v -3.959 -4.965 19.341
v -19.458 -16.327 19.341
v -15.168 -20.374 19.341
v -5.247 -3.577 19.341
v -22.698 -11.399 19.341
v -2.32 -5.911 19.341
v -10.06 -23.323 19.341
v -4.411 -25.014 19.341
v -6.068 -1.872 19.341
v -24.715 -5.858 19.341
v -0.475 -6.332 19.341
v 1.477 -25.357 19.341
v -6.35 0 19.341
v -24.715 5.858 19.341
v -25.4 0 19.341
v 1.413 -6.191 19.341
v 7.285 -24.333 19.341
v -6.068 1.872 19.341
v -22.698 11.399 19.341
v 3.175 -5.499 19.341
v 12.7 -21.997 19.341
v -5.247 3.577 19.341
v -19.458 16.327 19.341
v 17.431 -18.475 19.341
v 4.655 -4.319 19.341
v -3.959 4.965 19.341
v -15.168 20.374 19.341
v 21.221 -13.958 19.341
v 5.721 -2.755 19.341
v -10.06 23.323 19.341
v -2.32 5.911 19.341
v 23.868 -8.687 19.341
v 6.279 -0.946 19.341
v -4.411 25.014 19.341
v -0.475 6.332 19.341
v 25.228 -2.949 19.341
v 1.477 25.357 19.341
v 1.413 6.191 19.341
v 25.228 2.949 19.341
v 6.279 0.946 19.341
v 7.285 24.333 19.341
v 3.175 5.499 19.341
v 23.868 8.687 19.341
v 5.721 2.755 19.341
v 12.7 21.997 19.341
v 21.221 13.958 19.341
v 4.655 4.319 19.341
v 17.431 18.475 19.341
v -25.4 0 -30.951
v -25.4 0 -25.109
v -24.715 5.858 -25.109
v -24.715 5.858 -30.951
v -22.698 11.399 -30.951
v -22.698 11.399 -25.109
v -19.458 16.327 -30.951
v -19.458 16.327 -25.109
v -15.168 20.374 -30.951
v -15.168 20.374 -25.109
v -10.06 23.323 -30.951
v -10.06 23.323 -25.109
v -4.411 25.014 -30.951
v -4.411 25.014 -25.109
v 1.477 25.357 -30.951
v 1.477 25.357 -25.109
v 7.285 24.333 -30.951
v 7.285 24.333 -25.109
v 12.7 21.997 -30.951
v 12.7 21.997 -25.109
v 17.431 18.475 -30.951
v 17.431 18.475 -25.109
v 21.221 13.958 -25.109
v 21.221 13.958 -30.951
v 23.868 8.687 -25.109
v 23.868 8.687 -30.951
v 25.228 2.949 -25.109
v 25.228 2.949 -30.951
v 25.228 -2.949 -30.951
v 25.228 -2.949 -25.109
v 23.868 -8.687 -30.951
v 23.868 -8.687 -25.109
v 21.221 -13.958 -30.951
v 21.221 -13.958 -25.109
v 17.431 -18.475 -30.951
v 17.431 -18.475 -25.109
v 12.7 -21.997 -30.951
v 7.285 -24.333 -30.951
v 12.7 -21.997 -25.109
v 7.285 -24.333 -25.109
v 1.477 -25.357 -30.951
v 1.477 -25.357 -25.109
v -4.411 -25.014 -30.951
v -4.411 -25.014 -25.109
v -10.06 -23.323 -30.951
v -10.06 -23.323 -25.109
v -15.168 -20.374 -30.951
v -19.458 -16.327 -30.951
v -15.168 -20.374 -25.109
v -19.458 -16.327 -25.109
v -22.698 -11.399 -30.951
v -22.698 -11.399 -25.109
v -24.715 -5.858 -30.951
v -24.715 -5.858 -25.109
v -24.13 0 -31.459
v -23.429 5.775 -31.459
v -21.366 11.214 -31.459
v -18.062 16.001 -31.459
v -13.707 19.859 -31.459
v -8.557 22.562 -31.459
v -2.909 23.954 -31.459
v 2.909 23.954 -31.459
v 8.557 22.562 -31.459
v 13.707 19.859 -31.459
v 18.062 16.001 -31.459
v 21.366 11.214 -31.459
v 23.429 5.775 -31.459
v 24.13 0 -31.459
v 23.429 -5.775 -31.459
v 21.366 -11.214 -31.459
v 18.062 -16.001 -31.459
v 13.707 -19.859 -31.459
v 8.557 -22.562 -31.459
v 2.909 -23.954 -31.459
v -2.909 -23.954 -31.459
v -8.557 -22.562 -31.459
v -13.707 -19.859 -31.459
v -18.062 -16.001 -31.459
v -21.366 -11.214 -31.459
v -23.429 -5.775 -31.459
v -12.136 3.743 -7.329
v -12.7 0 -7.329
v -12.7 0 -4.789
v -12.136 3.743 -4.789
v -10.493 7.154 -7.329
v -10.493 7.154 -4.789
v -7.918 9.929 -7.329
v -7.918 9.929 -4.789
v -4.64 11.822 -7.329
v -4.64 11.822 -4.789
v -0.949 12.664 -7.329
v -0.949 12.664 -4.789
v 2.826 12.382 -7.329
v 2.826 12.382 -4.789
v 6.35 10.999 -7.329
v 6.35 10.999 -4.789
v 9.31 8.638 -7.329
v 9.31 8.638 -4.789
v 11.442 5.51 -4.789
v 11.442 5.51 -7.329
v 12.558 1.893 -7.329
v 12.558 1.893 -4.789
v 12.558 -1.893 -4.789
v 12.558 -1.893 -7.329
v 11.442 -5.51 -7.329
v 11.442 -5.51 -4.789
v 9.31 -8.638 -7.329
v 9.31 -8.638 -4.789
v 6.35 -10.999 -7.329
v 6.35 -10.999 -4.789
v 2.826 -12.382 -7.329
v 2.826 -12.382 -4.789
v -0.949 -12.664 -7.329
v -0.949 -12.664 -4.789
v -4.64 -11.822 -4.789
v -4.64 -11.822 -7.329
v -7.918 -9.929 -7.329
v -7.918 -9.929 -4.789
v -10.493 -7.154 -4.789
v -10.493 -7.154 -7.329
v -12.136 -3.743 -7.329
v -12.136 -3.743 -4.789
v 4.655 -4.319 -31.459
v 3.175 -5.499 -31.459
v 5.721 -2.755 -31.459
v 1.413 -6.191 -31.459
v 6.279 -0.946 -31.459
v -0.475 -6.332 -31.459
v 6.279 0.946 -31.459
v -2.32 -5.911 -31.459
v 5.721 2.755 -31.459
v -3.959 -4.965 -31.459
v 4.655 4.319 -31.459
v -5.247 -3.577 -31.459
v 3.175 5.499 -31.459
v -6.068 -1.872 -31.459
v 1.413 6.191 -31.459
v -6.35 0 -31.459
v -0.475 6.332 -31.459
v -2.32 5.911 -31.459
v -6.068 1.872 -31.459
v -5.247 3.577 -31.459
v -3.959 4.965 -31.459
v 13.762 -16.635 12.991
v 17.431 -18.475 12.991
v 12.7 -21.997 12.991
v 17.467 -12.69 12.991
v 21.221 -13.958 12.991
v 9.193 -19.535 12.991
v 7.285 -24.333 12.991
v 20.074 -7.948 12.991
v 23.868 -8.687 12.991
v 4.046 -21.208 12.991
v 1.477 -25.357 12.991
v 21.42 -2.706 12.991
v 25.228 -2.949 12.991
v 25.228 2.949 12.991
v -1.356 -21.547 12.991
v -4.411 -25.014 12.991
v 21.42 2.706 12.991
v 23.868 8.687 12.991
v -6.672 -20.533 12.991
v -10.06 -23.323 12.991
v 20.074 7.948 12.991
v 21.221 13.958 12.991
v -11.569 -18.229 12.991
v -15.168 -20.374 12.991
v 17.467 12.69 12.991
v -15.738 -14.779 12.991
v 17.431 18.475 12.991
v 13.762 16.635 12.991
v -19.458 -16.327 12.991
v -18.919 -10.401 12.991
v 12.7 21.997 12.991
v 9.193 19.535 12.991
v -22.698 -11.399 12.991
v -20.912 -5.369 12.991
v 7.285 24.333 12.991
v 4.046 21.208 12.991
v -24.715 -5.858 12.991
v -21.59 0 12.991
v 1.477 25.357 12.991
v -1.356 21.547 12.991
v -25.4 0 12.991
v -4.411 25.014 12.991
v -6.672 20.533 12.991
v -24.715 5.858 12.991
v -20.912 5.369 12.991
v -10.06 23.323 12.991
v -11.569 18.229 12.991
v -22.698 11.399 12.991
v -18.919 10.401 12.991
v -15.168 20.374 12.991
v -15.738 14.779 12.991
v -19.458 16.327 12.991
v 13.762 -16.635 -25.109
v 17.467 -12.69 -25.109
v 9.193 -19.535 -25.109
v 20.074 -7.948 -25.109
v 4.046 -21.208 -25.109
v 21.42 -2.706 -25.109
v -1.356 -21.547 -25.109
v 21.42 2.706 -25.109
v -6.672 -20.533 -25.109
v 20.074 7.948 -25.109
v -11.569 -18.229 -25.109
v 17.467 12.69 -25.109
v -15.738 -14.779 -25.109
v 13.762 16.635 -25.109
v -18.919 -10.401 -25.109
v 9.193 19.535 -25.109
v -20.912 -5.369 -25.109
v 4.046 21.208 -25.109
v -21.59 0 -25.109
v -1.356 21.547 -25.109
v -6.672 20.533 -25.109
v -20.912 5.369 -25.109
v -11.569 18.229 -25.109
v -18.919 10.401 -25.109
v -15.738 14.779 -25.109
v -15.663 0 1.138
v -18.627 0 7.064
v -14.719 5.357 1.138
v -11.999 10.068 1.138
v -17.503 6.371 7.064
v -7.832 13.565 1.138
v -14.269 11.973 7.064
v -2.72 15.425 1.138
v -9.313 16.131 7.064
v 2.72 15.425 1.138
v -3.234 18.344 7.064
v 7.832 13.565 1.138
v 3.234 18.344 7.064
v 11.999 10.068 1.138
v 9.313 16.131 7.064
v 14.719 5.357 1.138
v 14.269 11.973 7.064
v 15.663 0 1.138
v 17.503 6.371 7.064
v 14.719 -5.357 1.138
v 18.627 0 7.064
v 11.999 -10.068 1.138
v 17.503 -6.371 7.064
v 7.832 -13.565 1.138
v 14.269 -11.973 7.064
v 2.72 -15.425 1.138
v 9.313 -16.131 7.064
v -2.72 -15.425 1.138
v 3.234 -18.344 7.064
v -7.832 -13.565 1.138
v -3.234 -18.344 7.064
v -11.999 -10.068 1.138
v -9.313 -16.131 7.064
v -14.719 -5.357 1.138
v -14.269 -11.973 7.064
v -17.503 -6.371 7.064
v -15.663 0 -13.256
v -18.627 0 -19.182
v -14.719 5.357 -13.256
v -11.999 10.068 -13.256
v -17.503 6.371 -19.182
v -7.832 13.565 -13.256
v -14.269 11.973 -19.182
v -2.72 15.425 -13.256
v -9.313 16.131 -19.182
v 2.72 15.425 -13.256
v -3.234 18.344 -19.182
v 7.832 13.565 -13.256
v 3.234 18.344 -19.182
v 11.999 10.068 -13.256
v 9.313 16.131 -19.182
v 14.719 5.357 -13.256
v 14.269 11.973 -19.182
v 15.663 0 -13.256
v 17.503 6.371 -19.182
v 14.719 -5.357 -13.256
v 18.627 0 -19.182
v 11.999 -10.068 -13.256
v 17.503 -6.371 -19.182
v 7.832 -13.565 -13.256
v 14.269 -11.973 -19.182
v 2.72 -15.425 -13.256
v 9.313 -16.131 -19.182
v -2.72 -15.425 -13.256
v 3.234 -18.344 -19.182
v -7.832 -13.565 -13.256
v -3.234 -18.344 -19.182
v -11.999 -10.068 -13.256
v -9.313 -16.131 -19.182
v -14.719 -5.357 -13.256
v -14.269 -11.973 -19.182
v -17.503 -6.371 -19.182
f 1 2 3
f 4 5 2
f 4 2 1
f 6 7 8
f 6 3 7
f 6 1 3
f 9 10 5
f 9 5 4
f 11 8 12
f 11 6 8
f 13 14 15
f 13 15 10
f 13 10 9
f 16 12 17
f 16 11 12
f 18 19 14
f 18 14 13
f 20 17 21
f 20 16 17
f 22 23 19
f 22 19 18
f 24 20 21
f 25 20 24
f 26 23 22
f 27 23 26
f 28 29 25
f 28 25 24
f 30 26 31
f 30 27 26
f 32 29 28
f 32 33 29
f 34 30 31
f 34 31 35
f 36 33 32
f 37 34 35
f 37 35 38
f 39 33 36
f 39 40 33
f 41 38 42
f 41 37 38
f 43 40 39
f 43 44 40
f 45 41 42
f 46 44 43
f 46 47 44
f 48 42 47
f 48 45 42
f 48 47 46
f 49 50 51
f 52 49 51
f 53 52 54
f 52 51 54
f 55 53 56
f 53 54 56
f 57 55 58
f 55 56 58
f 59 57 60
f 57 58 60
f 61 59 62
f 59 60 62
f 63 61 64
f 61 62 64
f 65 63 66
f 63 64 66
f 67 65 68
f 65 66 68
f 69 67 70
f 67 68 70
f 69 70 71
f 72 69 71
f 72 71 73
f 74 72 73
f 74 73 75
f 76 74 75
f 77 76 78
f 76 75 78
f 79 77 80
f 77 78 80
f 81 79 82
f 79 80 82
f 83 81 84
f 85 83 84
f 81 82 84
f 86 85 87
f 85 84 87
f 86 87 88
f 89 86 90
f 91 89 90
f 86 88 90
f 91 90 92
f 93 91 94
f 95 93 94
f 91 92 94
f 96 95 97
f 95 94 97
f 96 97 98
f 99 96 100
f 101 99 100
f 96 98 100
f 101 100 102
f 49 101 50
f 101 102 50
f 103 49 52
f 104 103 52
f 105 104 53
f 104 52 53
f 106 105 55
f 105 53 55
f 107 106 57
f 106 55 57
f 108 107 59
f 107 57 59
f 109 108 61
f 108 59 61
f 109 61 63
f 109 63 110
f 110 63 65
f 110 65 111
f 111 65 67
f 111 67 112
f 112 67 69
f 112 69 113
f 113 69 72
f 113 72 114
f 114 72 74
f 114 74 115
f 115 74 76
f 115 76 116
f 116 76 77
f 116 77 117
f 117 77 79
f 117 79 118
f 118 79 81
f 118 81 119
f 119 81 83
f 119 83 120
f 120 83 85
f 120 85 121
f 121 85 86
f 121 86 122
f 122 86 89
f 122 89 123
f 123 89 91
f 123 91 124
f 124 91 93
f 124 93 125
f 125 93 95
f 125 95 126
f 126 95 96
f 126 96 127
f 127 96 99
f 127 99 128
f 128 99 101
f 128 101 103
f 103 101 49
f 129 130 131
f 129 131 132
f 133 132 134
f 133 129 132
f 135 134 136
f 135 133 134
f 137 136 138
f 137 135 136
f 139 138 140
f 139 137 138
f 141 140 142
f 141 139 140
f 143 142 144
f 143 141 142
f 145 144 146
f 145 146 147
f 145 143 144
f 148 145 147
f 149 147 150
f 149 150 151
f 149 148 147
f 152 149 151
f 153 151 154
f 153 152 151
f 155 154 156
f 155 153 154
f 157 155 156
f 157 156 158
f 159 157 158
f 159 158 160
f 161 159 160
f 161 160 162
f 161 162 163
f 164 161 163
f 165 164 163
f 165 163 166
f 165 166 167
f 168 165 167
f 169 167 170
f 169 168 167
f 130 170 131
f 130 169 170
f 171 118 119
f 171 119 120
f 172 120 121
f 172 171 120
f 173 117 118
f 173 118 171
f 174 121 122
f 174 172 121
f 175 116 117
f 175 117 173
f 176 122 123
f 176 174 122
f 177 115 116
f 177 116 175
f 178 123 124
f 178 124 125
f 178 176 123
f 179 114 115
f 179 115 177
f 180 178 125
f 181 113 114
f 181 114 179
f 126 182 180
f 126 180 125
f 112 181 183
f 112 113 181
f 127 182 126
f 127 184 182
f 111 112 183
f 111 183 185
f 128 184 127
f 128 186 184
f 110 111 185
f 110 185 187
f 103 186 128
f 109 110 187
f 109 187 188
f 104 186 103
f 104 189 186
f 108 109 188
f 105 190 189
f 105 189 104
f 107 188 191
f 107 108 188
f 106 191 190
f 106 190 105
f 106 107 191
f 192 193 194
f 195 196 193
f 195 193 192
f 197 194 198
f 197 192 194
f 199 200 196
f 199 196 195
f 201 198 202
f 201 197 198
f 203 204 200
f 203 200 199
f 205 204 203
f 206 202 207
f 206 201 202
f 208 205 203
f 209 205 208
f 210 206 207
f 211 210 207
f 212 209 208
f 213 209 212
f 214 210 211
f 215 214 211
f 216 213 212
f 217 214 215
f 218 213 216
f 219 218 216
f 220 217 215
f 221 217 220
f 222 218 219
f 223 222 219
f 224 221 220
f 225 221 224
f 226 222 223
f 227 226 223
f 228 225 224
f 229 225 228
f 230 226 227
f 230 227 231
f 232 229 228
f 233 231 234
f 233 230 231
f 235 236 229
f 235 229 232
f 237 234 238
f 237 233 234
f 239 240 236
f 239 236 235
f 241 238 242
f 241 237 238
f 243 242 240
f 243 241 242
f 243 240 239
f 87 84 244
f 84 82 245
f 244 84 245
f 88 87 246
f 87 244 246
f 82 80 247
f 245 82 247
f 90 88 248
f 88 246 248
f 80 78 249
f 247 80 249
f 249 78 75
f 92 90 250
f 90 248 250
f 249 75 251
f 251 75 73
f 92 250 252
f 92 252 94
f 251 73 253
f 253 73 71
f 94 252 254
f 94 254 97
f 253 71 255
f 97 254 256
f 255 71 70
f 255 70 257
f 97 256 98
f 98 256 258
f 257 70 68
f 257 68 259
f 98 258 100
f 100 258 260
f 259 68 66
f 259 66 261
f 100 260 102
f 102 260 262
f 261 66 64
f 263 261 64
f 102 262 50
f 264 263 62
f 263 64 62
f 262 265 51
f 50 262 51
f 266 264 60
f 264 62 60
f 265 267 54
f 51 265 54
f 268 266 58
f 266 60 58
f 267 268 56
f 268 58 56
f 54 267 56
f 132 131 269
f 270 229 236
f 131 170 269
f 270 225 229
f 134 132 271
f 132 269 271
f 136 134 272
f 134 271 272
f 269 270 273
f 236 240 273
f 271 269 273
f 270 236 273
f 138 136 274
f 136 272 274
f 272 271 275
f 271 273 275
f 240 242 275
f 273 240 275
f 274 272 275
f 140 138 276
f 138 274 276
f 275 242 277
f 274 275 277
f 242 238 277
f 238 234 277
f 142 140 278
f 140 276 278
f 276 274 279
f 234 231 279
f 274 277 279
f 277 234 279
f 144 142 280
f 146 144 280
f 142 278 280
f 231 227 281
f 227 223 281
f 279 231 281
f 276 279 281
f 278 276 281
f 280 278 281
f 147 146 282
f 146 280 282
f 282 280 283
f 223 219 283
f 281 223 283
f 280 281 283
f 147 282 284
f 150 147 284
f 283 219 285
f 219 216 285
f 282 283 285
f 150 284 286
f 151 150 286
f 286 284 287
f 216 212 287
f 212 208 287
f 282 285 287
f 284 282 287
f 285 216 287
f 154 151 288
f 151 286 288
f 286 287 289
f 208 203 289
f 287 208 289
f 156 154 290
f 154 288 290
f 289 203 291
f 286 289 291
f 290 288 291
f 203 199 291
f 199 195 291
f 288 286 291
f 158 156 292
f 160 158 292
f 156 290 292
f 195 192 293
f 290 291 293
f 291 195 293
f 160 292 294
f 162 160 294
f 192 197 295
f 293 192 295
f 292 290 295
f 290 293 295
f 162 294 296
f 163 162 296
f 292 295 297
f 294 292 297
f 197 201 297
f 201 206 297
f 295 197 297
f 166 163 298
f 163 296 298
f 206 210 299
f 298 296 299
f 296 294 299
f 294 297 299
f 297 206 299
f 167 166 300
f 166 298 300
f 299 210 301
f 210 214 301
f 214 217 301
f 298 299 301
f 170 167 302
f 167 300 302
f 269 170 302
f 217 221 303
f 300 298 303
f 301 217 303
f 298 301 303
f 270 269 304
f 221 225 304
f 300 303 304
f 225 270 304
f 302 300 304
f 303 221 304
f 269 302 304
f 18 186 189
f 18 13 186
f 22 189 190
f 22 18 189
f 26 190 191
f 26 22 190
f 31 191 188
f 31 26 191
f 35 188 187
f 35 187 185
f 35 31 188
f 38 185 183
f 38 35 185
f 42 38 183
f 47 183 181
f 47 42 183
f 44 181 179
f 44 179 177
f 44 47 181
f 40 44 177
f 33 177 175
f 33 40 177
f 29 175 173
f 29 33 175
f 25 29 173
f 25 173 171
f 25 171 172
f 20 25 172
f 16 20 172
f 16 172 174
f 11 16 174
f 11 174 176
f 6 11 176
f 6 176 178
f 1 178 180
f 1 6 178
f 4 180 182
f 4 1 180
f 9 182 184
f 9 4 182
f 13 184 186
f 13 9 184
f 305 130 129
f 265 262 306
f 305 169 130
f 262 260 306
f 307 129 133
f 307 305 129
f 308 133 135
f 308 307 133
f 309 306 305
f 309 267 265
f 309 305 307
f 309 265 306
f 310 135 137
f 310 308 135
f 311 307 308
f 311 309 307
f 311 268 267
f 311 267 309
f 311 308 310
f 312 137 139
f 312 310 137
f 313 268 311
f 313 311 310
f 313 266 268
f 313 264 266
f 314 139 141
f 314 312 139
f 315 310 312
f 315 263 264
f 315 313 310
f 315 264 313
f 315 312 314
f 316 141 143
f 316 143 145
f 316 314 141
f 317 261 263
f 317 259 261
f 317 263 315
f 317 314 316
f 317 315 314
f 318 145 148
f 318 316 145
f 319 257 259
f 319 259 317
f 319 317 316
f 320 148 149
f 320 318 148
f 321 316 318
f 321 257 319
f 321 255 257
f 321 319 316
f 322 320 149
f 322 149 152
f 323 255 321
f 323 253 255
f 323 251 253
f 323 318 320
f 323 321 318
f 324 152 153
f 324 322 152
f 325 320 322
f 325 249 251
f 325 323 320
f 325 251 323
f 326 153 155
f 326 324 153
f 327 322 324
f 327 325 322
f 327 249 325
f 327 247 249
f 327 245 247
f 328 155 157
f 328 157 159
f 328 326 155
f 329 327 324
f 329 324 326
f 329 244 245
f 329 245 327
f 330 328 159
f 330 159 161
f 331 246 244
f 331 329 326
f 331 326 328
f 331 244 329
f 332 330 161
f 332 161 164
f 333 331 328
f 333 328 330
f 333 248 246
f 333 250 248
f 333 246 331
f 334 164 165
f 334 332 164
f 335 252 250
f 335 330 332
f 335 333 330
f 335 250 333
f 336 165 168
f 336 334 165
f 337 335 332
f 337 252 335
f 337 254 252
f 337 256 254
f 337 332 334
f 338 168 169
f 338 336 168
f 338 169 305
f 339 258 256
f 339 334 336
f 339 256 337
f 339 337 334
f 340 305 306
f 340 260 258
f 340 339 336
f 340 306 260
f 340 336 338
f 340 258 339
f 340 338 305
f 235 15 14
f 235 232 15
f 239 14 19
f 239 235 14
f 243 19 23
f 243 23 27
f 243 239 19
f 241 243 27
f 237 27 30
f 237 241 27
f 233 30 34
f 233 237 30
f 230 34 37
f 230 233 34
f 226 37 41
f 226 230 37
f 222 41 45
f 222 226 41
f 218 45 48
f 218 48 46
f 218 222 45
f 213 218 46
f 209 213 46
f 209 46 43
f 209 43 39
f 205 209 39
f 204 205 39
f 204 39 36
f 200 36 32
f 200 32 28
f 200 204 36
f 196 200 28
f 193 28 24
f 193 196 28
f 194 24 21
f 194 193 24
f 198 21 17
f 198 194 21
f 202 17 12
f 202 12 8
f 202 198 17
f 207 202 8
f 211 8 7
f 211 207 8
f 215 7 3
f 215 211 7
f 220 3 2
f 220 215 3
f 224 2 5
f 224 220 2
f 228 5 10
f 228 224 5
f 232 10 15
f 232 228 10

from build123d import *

# Parameters (mm, degrees)
F0_W     = 12.7
F0_H     = 6.35
F0_W_2   = 6.35
F0_H_2   = 38.1
F0_H_3   = 2.4236633693
F2_SIZE2 = 8.89
F2_SIZE  = 17.78
F3_SIZE2 = 0.508
F3_SIZE  = 1.27


with BuildPart() as f1:
    # F0 (on Front) → F1 (revolve)
    with BuildSketch(Plane.XZ):
        with Locations((-19.05, -28.2841619736)):
            Rectangle(F0_W, F0_H)
        with Locations((-9.525, -6.0591619736)):
            Rectangle(F0_W_2, F0_H_2)
        with Locations((-9.525, -28.2841619736)):
            Rectangle(F0_W_2, F0_H)
        with Locations((-9.525, 14.2026697111)):
            Rectangle(F0_W_2, F0_H_3)
        with Locations((-19.05, 14.2026697111)):
            Rectangle(F0_W, F0_H_3)
        Polygon((-25.4, 15.4145013957), (-12.7, 15.4145013957), (-6.35, 15.4145013957), (-6.35, 19.3408380264), (-25.4, 19.3408380264), align=None)
    revolve(axis=Axis((0, 0, 6.5382700413), (0, 0, -1)))

    # F2
    f2_edges = [f1.edges().sort_by_distance(p)[0] for p in [
        (12.7, 0, 12.990838),
        (12.7, 0, -25.109162),
    ]]
    f2_side = f1.faces().sort_by_distance((12.7, 0, -6.059162))[0]
    chamfer(f2_edges, length=F2_SIZE, length2=F2_SIZE2, reference=f2_side)

    # F3
    f3_edges = [f1.edges().sort_by_distance(p)[0] for p in [
        (25.4, 0, -31.459162),
    ]]
    f3_side = f1.faces().sort_by_distance((24.68158, 0, -31.459162))[0]
    chamfer(f3_edges, length=F3_SIZE, length2=F3_SIZE2, reference=f3_side)


solid = f1.part
